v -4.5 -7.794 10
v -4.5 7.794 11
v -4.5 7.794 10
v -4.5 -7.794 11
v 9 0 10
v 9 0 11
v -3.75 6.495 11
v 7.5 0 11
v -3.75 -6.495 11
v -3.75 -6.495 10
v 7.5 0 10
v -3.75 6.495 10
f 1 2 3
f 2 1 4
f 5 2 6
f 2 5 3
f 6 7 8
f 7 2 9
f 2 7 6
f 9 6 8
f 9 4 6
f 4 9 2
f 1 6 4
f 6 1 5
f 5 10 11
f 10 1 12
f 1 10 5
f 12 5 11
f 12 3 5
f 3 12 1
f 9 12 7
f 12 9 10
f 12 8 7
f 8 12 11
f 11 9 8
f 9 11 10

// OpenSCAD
$fn=3;
th=10;
w=15;
h=1;
tol=0;
pi=3.1415;

module star()
{
//cube([1,1,1]);

circle(1);
}

/*
star();
translate([5,3,0])
star();

translate([10,0,0])
star();

translate([5,-3,0])
star();
*/
module test()
{
//translate([0,0,-4.4])
//rotate([90,0,0])
union()
{
for(i=[1:h])
{

  translate([0,0,0])
  star();

}
}
}


//heela
module hela()
{
union()
{
for(i=[0:(60)])
{
  rotate([0,0,0])
  translate([cos(i*2*pi)*8,sin(i*2*pi)*8,sin(i*25)*2])
  //rotate([0,i*360/65,0])

  test();
  
}
}
}


module top()
{
translate([0,0,10])
difference()
{
cylinder(r=9,h=1);
translate([0,0,-.2])
cylinder(r=7.5,h=4);
}

}

module bottom()
{
translate([0,0,-2])
cylinder(r=9,h=2);

}
//bottom();
top();


hela();
